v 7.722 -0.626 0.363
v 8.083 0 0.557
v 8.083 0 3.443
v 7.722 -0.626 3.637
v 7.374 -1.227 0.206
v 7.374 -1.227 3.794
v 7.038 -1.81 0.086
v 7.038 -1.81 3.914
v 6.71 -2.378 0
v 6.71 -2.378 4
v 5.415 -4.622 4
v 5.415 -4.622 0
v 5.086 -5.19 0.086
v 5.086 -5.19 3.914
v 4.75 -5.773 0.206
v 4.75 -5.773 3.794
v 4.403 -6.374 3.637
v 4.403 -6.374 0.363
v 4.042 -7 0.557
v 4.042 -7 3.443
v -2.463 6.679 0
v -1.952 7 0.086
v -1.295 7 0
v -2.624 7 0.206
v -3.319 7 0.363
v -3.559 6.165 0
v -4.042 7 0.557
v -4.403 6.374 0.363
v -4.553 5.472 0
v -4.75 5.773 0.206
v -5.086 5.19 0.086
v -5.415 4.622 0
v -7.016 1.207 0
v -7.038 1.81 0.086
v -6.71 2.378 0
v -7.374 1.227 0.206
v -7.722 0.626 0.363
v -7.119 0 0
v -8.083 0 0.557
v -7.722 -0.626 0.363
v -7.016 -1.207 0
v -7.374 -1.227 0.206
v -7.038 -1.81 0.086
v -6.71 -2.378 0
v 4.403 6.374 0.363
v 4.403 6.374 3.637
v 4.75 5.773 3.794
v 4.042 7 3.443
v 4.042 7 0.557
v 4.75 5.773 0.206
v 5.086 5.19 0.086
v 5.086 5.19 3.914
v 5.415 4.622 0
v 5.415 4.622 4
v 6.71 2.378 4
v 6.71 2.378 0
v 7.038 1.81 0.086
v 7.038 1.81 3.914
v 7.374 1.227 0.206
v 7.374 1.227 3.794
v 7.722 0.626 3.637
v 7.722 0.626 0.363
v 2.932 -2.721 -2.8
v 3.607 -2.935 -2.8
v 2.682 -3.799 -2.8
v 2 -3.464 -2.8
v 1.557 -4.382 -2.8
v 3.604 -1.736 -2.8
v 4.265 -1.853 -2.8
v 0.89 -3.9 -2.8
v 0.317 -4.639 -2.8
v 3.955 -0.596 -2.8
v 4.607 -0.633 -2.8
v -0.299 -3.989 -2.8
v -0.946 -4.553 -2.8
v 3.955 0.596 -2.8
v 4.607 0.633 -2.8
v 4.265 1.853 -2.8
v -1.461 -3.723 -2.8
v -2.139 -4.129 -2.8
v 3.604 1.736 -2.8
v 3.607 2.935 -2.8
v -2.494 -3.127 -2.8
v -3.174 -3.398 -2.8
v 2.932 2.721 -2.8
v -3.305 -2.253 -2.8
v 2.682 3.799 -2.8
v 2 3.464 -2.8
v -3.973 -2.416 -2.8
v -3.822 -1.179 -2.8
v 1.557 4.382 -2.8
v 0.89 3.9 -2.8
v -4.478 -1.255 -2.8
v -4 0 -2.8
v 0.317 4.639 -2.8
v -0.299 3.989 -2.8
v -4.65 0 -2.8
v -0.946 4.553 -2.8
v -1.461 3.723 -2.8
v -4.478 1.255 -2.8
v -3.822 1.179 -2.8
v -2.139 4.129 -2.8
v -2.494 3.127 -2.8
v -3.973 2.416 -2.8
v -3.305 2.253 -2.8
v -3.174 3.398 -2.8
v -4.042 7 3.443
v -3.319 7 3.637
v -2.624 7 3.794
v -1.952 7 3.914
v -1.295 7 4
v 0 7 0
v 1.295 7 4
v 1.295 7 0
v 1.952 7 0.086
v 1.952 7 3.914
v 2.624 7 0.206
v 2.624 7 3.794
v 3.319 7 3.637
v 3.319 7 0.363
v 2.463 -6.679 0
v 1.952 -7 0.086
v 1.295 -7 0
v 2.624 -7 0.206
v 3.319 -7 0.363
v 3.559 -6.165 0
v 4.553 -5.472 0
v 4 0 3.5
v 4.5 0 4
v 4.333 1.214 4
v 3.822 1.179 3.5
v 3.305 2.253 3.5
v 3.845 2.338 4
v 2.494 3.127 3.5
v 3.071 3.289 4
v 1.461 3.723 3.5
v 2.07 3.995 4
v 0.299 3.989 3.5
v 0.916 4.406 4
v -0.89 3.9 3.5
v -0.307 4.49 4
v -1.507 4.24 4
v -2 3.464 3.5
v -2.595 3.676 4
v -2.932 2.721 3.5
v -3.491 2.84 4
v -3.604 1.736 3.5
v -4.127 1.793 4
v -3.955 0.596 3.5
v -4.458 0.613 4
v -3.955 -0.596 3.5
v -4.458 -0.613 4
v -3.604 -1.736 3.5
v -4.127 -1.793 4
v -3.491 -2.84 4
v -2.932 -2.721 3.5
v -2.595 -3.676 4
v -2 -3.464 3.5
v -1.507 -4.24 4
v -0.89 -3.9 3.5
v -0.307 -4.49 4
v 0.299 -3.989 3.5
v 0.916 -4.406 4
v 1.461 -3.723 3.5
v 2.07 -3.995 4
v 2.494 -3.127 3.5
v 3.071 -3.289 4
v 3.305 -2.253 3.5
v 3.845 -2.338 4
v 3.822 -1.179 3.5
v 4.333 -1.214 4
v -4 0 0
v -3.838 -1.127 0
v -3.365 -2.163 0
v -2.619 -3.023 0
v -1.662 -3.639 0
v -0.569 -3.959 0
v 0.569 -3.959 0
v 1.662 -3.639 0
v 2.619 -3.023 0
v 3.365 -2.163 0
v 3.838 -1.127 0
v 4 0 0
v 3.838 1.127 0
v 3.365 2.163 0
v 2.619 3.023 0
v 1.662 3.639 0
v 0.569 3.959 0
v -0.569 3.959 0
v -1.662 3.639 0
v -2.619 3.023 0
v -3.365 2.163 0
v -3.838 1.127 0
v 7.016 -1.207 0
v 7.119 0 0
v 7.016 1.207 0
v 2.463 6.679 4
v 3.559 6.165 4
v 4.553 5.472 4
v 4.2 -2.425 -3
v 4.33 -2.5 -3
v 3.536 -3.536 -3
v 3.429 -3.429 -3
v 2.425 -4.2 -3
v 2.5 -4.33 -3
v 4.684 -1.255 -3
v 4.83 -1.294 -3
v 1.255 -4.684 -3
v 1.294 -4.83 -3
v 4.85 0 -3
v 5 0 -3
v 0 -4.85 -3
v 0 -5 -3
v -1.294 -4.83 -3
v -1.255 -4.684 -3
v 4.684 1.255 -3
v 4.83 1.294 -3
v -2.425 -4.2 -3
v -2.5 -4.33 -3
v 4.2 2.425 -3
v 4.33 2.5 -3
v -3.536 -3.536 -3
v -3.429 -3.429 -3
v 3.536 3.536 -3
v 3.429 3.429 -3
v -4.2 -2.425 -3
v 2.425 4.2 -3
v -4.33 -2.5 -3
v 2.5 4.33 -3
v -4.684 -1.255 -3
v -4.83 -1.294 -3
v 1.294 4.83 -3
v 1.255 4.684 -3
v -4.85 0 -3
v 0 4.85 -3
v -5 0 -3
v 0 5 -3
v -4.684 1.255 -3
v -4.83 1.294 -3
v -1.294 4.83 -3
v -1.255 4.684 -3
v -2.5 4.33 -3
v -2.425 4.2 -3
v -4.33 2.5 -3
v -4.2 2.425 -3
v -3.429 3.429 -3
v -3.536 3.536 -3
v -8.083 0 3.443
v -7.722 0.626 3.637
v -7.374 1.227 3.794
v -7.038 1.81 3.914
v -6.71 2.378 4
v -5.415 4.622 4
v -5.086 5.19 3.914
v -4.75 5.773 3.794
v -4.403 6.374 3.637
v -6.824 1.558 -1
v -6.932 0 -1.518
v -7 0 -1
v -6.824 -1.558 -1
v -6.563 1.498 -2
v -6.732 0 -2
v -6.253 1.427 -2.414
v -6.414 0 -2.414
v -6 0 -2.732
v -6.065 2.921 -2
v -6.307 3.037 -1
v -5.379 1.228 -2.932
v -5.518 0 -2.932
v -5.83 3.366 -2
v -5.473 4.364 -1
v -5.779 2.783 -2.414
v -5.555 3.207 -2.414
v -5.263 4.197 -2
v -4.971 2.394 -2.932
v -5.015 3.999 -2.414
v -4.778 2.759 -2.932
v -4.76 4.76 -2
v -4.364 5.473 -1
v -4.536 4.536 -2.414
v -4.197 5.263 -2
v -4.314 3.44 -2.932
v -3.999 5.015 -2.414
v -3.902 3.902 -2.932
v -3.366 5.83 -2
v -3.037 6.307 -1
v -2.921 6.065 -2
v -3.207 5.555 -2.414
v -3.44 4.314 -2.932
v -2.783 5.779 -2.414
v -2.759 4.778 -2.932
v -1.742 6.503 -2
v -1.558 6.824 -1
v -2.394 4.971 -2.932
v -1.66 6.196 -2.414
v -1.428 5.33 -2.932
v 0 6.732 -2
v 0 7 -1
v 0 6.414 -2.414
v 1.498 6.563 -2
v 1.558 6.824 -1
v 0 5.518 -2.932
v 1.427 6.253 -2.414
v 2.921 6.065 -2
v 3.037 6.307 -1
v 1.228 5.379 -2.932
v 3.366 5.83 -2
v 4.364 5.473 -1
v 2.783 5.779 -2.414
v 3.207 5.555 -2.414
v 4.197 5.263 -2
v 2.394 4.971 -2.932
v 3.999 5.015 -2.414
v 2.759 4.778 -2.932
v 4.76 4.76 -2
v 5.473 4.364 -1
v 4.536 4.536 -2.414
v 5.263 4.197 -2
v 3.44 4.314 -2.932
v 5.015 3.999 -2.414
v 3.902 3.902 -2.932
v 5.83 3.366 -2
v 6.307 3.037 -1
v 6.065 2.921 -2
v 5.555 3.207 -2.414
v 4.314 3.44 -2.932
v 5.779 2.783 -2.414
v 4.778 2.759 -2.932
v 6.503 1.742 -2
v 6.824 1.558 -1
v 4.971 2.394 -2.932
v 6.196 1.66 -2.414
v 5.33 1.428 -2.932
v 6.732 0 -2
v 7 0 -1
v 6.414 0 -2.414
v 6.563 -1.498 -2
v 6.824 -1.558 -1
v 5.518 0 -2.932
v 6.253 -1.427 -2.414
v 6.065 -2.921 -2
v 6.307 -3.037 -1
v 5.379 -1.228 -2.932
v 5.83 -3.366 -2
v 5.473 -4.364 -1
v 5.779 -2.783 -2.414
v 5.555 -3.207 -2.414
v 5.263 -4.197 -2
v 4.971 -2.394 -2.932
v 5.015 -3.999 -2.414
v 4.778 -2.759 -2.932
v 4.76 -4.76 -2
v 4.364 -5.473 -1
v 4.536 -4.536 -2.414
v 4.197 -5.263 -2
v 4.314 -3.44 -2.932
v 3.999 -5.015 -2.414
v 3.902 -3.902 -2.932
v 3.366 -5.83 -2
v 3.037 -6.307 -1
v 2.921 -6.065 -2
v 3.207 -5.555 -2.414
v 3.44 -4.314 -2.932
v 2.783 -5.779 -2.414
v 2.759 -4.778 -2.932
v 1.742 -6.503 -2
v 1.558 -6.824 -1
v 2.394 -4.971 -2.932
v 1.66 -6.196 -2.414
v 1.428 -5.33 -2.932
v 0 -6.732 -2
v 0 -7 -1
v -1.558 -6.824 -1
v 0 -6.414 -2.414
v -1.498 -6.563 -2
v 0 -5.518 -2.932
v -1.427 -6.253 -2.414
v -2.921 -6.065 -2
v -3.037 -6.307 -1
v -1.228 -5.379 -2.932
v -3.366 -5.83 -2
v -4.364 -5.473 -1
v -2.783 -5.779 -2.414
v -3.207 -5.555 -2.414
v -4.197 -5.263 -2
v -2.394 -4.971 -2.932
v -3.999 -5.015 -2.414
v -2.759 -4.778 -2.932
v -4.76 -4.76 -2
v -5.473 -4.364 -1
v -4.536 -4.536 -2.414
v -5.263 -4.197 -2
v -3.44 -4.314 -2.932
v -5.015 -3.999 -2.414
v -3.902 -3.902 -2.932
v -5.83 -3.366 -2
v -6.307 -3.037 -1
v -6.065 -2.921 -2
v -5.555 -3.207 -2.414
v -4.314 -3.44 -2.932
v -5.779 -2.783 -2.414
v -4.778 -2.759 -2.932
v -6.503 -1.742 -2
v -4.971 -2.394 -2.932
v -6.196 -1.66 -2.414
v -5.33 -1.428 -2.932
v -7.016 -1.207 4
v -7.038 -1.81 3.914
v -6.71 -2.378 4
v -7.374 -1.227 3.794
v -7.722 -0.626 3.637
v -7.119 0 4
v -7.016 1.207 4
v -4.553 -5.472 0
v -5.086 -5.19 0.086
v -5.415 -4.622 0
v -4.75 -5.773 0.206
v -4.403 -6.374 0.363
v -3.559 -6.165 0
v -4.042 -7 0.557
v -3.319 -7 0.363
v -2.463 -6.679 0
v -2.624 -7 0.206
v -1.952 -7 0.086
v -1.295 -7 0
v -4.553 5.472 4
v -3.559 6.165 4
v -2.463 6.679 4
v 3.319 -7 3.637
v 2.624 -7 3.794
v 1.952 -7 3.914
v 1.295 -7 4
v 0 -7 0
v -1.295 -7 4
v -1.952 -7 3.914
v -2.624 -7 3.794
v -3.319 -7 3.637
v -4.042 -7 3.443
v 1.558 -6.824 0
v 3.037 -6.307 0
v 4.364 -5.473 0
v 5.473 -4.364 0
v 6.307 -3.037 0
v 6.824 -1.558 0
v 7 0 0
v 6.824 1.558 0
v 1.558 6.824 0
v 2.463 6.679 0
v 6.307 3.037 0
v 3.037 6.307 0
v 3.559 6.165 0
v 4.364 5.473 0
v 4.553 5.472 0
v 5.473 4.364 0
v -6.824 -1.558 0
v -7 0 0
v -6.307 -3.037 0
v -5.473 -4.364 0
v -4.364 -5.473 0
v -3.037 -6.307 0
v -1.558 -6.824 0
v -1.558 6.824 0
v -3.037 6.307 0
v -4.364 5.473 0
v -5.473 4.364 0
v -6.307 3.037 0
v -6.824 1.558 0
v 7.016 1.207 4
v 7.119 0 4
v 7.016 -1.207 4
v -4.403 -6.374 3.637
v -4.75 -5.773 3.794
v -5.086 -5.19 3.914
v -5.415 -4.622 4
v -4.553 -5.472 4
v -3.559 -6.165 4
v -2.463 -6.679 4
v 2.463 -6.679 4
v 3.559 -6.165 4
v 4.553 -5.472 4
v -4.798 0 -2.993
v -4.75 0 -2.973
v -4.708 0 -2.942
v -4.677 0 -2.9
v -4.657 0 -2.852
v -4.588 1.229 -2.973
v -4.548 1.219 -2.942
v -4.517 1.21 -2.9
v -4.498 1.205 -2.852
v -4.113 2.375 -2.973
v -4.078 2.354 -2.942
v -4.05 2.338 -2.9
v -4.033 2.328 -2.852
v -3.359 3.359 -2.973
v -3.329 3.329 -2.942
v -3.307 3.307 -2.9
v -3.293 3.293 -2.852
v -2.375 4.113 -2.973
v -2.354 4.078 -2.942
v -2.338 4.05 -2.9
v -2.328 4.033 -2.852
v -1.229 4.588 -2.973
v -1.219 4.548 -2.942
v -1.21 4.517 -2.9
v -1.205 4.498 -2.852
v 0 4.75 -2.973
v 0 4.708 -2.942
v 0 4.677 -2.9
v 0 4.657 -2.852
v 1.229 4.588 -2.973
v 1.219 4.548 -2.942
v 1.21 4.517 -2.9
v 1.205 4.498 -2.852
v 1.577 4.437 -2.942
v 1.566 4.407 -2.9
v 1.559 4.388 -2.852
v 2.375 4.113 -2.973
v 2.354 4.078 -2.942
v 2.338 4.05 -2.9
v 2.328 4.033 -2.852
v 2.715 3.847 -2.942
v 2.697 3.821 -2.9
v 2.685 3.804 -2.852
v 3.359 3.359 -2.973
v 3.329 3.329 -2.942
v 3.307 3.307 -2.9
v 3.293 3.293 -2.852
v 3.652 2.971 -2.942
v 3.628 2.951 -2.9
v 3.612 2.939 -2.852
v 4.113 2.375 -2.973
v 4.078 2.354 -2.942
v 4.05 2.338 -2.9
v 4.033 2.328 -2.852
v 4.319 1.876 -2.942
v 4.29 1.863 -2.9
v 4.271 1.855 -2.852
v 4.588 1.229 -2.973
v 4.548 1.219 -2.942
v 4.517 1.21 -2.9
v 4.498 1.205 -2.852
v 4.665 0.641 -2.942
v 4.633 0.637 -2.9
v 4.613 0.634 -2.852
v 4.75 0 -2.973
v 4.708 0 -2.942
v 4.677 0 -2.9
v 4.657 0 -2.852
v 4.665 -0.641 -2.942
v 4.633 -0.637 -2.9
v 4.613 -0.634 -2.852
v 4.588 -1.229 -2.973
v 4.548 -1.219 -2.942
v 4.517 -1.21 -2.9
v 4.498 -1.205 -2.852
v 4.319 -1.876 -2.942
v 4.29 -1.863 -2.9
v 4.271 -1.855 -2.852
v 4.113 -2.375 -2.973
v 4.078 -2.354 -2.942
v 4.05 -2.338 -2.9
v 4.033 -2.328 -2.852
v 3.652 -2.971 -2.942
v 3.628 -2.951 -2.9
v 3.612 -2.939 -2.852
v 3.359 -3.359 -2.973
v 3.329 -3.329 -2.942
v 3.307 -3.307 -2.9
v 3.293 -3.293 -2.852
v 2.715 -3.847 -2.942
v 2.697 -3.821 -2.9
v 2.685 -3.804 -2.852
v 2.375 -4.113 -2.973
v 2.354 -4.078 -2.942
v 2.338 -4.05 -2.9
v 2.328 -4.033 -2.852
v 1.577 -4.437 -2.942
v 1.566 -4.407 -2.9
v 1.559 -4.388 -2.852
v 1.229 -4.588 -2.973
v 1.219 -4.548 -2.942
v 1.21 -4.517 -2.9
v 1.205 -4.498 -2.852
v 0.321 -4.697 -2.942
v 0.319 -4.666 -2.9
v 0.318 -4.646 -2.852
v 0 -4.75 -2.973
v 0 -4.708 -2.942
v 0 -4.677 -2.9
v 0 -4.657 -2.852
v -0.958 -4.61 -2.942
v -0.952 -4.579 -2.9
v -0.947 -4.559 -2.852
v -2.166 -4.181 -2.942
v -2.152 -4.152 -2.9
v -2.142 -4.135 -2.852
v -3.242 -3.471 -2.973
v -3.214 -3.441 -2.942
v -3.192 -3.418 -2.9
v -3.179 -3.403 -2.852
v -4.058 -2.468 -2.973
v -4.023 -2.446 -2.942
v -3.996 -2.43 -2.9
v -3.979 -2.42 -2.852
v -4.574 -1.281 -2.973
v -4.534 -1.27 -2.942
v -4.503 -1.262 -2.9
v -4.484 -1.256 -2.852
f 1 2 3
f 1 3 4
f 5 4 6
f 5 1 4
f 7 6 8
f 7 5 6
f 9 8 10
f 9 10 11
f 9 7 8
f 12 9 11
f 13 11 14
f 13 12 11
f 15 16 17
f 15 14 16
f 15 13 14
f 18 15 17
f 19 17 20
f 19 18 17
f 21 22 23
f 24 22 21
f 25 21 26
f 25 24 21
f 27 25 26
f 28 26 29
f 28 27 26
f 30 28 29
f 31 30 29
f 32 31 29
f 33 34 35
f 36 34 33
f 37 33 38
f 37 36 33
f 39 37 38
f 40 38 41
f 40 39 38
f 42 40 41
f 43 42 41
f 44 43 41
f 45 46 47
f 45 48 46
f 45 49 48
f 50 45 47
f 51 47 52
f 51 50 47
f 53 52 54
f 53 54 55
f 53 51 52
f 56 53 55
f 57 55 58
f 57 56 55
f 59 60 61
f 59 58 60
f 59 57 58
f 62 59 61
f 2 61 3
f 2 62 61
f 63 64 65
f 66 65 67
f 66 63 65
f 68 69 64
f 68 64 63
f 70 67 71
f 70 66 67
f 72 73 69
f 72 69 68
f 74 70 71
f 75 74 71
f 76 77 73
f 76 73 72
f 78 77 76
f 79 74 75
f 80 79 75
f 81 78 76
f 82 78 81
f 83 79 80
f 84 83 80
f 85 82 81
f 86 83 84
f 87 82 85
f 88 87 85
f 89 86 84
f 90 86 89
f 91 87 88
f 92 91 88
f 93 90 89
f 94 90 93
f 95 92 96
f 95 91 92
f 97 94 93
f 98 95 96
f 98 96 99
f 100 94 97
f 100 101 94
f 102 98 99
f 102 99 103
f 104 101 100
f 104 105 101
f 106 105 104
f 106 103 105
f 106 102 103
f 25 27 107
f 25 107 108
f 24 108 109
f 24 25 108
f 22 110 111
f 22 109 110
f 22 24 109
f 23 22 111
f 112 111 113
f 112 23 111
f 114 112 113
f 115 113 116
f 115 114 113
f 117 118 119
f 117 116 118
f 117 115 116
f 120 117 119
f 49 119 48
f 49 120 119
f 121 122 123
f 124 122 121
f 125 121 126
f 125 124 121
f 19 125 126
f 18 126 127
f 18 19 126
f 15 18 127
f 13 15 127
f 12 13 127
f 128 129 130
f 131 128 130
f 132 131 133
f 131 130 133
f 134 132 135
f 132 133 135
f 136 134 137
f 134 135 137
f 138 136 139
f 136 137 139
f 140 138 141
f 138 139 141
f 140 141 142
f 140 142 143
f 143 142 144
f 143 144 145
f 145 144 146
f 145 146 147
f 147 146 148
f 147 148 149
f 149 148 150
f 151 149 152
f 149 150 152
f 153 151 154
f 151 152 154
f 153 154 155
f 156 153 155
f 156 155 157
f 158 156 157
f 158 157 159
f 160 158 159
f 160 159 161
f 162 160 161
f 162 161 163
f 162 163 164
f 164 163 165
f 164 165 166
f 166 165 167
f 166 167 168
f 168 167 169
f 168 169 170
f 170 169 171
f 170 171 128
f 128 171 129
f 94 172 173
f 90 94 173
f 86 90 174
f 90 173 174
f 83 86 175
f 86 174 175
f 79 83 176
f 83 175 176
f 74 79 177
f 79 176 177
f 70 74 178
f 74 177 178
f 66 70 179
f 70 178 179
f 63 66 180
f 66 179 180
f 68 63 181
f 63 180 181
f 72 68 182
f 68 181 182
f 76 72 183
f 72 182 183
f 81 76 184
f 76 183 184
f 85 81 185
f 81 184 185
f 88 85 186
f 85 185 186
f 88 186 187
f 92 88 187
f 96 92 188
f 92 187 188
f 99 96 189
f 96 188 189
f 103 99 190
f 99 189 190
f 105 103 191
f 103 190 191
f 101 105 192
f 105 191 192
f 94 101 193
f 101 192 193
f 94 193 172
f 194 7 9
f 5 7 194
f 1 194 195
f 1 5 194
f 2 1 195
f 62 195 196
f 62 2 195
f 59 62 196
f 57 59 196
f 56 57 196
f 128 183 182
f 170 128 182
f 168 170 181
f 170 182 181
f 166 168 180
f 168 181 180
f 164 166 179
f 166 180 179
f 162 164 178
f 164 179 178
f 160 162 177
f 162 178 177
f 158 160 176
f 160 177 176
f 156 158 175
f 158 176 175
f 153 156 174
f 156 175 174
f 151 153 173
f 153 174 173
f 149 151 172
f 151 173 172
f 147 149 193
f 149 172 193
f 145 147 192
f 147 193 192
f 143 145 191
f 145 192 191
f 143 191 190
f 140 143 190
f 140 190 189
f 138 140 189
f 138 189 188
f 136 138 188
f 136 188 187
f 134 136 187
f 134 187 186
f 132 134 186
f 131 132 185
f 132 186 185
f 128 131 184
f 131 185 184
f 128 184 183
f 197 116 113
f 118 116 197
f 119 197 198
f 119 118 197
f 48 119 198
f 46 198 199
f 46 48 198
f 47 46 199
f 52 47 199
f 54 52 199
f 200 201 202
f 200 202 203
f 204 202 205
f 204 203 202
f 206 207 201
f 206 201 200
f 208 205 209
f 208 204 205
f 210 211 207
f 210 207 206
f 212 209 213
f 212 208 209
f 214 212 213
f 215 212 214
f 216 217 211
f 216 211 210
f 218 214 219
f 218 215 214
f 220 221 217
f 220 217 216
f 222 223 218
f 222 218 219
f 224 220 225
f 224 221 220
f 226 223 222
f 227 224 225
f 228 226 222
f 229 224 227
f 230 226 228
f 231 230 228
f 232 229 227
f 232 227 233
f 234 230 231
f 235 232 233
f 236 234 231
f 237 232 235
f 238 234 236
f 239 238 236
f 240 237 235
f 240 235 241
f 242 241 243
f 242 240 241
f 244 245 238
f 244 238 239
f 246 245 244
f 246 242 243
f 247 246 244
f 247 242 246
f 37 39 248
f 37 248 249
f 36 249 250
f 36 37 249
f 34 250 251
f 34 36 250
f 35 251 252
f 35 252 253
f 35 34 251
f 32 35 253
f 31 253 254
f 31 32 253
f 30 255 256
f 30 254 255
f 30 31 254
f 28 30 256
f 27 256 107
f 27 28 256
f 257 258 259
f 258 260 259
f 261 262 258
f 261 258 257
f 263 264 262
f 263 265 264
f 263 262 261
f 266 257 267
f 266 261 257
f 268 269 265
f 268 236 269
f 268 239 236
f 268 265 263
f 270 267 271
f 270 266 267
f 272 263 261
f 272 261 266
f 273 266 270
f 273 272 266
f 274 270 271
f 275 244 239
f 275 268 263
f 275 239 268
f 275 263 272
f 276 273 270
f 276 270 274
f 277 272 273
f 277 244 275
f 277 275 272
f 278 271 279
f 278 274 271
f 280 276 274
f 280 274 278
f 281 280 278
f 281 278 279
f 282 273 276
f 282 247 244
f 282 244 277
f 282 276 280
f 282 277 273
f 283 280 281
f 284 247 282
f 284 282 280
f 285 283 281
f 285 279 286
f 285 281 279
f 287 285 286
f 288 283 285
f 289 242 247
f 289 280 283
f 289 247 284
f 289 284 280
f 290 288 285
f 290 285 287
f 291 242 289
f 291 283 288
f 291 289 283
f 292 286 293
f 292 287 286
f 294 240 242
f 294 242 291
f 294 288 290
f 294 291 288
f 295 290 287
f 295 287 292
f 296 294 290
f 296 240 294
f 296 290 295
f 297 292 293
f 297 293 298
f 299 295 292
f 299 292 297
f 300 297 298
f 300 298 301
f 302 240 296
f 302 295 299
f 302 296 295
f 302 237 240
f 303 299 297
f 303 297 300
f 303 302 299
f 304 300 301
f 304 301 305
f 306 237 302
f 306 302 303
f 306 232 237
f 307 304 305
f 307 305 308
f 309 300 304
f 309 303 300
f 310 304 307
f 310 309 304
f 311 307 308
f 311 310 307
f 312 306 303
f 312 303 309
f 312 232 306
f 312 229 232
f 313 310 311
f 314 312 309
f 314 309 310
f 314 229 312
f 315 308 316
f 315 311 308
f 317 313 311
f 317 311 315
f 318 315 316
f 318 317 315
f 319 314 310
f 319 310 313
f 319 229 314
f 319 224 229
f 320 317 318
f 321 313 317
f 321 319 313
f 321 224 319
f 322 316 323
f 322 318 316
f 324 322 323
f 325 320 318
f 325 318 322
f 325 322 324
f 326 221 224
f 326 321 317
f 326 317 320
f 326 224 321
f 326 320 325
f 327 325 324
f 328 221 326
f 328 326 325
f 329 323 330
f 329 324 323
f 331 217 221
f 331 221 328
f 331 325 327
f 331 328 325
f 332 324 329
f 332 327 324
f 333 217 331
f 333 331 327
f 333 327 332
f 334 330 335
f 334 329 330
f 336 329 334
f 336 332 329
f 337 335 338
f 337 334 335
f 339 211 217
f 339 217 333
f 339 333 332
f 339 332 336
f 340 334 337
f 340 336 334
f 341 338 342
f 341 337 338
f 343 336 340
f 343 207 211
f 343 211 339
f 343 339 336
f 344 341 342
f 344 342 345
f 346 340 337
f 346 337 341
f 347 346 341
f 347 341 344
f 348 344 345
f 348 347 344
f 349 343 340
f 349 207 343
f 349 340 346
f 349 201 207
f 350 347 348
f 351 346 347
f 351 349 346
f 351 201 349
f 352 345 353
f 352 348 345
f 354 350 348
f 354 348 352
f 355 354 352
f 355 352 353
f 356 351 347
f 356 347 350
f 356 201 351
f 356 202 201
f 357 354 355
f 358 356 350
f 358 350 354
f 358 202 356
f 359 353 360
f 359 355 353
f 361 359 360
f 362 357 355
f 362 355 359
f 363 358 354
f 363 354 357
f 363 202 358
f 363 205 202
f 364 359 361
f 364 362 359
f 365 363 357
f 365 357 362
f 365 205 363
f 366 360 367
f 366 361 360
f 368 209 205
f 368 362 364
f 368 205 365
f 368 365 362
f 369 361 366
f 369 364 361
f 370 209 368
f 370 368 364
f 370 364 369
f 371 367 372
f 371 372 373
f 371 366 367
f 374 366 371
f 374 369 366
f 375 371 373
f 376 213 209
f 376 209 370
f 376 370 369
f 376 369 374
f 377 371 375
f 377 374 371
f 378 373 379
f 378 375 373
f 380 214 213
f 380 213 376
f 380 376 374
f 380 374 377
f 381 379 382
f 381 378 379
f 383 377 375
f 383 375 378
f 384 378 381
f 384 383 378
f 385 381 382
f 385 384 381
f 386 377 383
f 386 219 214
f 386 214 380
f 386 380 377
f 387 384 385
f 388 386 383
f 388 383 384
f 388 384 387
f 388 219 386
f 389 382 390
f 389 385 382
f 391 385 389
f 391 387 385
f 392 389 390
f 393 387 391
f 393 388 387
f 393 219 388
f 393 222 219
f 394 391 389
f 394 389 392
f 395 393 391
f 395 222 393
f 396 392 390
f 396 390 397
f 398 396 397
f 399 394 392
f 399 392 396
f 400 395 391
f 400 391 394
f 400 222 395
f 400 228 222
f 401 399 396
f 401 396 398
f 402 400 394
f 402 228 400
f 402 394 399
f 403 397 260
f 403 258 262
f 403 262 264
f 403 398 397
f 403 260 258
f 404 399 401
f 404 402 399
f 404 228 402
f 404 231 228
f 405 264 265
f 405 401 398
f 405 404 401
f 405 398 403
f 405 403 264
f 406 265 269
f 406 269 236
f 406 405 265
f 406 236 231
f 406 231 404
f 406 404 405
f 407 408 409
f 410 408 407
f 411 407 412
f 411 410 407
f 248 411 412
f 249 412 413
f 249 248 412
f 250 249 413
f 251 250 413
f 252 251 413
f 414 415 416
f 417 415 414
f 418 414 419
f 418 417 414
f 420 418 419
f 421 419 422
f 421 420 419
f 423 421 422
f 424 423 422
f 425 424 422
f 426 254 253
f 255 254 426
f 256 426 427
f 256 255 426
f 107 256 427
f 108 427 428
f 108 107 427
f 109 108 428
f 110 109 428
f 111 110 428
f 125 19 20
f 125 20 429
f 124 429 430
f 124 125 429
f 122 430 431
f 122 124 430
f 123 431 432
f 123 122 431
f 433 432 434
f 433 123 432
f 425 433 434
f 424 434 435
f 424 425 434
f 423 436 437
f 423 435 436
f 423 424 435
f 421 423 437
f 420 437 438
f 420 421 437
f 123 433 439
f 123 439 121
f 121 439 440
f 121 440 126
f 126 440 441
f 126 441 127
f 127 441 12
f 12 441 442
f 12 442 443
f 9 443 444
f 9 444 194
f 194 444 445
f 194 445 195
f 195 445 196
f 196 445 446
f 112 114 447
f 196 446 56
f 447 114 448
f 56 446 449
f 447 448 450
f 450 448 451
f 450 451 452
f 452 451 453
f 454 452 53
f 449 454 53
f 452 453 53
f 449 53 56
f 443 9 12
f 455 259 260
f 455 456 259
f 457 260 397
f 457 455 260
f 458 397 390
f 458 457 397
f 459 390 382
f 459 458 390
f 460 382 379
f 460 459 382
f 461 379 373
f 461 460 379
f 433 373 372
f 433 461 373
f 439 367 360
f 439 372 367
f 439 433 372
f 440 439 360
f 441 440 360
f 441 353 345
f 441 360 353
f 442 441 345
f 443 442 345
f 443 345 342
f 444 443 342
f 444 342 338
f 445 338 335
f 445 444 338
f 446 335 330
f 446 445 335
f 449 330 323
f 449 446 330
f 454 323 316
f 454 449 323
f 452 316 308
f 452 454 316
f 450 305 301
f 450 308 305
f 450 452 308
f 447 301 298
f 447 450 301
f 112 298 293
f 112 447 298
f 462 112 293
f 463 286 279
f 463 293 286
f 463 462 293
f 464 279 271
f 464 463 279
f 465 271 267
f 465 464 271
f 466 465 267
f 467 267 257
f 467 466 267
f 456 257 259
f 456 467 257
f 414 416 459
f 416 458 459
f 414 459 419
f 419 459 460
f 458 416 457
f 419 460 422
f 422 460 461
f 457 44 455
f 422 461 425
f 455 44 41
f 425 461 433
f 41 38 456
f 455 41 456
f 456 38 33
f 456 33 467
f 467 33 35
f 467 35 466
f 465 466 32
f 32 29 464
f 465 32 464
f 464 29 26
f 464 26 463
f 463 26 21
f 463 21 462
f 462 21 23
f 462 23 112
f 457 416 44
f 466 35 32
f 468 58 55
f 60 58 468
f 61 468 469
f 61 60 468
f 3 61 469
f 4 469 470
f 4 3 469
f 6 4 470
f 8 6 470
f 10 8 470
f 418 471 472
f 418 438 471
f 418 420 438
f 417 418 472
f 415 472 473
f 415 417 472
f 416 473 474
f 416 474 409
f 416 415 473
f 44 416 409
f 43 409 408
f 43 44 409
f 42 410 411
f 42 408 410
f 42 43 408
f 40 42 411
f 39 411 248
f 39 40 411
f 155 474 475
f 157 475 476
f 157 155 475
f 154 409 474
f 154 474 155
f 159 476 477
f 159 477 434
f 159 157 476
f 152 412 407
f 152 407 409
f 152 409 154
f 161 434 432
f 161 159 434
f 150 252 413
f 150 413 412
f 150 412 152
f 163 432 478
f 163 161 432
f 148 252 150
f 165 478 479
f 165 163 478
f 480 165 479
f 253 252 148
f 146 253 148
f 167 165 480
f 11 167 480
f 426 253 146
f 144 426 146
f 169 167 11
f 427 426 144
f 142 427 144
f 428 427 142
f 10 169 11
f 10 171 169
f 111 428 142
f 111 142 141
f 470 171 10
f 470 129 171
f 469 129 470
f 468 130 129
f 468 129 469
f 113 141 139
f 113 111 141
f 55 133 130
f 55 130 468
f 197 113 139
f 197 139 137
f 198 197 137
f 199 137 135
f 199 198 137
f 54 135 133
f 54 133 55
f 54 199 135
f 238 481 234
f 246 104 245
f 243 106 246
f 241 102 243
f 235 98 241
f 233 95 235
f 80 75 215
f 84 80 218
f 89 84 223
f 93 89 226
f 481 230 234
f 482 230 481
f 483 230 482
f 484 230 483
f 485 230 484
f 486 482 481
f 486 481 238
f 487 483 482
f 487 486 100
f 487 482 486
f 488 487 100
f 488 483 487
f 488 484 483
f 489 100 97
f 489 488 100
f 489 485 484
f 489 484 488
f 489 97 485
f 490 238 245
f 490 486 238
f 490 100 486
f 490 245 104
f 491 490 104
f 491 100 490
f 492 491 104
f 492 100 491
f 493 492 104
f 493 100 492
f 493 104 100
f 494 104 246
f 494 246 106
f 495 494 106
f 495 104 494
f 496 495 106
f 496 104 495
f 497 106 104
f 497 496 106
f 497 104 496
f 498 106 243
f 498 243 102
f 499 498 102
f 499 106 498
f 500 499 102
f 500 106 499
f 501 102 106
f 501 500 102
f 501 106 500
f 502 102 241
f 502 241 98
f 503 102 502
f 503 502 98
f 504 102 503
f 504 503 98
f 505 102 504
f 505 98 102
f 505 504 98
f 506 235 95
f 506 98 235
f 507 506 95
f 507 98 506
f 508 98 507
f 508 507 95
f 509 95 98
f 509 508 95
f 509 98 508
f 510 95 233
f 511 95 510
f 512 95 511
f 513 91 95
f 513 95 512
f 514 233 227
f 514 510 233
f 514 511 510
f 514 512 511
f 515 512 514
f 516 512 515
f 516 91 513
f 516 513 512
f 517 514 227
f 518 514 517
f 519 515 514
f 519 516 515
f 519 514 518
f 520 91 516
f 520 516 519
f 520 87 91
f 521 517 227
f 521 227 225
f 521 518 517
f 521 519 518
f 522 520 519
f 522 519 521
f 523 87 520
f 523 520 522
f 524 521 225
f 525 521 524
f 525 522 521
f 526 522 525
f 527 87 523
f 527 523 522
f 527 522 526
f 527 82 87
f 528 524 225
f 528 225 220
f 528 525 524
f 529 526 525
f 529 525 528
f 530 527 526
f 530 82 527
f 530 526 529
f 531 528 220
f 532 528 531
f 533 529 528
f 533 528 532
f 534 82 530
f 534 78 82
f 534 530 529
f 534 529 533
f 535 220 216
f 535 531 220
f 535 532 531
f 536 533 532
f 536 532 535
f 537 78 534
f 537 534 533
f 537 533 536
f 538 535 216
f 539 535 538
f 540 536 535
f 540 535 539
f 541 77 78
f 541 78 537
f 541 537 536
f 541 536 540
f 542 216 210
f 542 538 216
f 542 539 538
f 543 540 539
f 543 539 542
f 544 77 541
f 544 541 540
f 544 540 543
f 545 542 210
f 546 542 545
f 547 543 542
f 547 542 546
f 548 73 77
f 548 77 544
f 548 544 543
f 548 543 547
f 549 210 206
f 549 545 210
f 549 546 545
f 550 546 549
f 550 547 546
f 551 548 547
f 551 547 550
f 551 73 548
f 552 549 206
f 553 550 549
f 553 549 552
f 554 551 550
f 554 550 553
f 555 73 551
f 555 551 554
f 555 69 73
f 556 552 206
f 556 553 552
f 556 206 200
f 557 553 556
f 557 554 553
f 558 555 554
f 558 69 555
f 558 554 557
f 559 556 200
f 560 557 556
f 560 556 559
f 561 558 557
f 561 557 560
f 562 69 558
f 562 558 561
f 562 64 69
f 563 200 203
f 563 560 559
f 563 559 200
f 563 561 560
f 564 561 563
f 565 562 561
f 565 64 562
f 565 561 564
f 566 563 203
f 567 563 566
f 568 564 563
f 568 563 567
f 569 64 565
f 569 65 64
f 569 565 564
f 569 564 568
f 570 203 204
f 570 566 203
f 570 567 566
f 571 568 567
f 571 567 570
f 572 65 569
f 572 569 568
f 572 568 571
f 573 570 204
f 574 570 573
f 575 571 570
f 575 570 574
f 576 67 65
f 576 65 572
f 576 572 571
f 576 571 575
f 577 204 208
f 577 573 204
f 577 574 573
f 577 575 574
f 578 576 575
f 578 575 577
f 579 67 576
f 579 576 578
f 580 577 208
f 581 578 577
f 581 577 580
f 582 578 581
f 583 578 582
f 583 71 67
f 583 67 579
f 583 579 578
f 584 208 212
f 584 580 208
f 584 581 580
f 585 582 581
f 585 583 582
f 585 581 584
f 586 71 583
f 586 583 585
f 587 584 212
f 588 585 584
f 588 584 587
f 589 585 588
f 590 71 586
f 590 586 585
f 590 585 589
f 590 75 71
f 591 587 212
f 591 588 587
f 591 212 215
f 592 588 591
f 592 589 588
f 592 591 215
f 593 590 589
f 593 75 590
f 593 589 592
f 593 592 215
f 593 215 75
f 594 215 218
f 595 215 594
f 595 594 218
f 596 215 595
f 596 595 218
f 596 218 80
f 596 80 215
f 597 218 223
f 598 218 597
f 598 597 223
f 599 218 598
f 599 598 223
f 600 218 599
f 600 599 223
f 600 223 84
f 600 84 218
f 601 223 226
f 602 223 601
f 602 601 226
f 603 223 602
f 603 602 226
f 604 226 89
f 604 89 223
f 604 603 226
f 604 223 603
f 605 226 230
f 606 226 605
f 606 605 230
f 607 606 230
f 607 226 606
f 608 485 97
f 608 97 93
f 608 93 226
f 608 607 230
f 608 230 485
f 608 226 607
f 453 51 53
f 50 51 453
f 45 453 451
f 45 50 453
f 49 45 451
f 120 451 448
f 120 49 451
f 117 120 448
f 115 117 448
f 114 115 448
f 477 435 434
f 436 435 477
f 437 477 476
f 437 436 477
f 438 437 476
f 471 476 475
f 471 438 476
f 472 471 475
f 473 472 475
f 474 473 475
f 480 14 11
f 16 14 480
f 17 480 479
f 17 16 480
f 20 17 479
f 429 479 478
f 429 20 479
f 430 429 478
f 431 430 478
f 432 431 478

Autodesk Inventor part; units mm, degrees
ref_plane "YZ Plane" through (0, 0, 0) normal (1, 0, 0) x (0, 1, 0)
ref_plane "XZ Plane" through (0, 0, 0) normal (0, 1, 0) x (-1, 0, 0)
ref_plane "XY Plane" through (0, 0, 0) normal (0, 0, 1) x (1, 0, 0)
sketch "Эскиз1" plane through (0, 0, 0) normal (0, 0, 1) x (1, 0, 0)
  circle A0 centre (0, 0) radius 4
  line L0 (8.0829, 0) -> (4.0415, -7)
  line L1 (4.0415, -7) -> (-4.0415, -7)
  line L2 (-4.0415, -7) -> (-8.0829, 0)
  line L3 (-8.0829, 0) -> (-4.0415, 7)
  line L4 (-4.0415, 7) -> (4.0415, 7)
  line L5 (4.0415, 7) -> (8.0829, 0)
  dimension "d0" = 8
  dimension "d1" = 14
extrude "Выдавливание1" add sketch "Эскиз1" along normal blind 4
sketch "Эскиз2" plane through (0, 0, 0) normal (0, 1, 0) x (-1, 0, 0)
  line L0 (0, 0) -> (0, 12.9838)
  line L1 (-4.0415, 0) -> (-8.0829, 0) construction
  line L2 (-8.0829, 0) -> (-8.0829, 4) construction
  line L3 (-8.0829, 4) -> (-4.0415, 4) construction
  line L4 (-3.7273, -1.9581) -> (-10.5829, 2)
  line L5 (-10.5829, 2) -> (-3.7273, 5.9581)
  line L6 (-3.7273, 5.9581) -> (-11.5829, 5.9581)
  line L7 (-11.5829, 5.9581) -> (-11.5829, -1.9581)
  line L8 (-11.5829, -1.9581) -> (-3.7273, -1.9581)
  line L9 (-8.0829, 2) -> (-29.2681, 2) construction
  point P0 (-11.5829, 2)
  dimension "d4" = 60
  dimension "d5" = 1
  dimension "d6" = 3.5
revolve "Вращение1" cut sketch "Эскиз2" angle 360 about axis through (0, 0, 0) along (0, 0, 1)
sketch "Эскиз3" plane through (0, 0, 0) normal (0, 0, -1) x (-1, 0, 0)
  line L0 (5.4146, -4.6216) -> (6.7097, -2.3784) construction
  circle A0 centre (0, 0) radius 7
  circle A1 centre (0, 0) radius 4 projected
extrude "Выдавливание2" add sketch "Эскиз3" along normal blind 3
fillet "Сопряжение1" radius 2 1 edges at (7, 0, -3)
sketch "Эскиз4" plane through (0, 0, -3) normal (0, 0, -1) x (-1, 0, 0)
  circle A0 centre (0, 0) radius 4 projected
  circle A1 centre (0, 0) radius 4.65
  dimension "d14" = 9.3
extrude "Выдавливание3" cut sketch "Эскиз4" against normal blind 0.2
fillet "Сопряжение2" radius 0.2 1 edges at (4.65, 0, -3)
chamfer "Фаска2" distance 0.5 angle 45 1 edges at (-4, 0, 4)
properties part number "paris_nut"
